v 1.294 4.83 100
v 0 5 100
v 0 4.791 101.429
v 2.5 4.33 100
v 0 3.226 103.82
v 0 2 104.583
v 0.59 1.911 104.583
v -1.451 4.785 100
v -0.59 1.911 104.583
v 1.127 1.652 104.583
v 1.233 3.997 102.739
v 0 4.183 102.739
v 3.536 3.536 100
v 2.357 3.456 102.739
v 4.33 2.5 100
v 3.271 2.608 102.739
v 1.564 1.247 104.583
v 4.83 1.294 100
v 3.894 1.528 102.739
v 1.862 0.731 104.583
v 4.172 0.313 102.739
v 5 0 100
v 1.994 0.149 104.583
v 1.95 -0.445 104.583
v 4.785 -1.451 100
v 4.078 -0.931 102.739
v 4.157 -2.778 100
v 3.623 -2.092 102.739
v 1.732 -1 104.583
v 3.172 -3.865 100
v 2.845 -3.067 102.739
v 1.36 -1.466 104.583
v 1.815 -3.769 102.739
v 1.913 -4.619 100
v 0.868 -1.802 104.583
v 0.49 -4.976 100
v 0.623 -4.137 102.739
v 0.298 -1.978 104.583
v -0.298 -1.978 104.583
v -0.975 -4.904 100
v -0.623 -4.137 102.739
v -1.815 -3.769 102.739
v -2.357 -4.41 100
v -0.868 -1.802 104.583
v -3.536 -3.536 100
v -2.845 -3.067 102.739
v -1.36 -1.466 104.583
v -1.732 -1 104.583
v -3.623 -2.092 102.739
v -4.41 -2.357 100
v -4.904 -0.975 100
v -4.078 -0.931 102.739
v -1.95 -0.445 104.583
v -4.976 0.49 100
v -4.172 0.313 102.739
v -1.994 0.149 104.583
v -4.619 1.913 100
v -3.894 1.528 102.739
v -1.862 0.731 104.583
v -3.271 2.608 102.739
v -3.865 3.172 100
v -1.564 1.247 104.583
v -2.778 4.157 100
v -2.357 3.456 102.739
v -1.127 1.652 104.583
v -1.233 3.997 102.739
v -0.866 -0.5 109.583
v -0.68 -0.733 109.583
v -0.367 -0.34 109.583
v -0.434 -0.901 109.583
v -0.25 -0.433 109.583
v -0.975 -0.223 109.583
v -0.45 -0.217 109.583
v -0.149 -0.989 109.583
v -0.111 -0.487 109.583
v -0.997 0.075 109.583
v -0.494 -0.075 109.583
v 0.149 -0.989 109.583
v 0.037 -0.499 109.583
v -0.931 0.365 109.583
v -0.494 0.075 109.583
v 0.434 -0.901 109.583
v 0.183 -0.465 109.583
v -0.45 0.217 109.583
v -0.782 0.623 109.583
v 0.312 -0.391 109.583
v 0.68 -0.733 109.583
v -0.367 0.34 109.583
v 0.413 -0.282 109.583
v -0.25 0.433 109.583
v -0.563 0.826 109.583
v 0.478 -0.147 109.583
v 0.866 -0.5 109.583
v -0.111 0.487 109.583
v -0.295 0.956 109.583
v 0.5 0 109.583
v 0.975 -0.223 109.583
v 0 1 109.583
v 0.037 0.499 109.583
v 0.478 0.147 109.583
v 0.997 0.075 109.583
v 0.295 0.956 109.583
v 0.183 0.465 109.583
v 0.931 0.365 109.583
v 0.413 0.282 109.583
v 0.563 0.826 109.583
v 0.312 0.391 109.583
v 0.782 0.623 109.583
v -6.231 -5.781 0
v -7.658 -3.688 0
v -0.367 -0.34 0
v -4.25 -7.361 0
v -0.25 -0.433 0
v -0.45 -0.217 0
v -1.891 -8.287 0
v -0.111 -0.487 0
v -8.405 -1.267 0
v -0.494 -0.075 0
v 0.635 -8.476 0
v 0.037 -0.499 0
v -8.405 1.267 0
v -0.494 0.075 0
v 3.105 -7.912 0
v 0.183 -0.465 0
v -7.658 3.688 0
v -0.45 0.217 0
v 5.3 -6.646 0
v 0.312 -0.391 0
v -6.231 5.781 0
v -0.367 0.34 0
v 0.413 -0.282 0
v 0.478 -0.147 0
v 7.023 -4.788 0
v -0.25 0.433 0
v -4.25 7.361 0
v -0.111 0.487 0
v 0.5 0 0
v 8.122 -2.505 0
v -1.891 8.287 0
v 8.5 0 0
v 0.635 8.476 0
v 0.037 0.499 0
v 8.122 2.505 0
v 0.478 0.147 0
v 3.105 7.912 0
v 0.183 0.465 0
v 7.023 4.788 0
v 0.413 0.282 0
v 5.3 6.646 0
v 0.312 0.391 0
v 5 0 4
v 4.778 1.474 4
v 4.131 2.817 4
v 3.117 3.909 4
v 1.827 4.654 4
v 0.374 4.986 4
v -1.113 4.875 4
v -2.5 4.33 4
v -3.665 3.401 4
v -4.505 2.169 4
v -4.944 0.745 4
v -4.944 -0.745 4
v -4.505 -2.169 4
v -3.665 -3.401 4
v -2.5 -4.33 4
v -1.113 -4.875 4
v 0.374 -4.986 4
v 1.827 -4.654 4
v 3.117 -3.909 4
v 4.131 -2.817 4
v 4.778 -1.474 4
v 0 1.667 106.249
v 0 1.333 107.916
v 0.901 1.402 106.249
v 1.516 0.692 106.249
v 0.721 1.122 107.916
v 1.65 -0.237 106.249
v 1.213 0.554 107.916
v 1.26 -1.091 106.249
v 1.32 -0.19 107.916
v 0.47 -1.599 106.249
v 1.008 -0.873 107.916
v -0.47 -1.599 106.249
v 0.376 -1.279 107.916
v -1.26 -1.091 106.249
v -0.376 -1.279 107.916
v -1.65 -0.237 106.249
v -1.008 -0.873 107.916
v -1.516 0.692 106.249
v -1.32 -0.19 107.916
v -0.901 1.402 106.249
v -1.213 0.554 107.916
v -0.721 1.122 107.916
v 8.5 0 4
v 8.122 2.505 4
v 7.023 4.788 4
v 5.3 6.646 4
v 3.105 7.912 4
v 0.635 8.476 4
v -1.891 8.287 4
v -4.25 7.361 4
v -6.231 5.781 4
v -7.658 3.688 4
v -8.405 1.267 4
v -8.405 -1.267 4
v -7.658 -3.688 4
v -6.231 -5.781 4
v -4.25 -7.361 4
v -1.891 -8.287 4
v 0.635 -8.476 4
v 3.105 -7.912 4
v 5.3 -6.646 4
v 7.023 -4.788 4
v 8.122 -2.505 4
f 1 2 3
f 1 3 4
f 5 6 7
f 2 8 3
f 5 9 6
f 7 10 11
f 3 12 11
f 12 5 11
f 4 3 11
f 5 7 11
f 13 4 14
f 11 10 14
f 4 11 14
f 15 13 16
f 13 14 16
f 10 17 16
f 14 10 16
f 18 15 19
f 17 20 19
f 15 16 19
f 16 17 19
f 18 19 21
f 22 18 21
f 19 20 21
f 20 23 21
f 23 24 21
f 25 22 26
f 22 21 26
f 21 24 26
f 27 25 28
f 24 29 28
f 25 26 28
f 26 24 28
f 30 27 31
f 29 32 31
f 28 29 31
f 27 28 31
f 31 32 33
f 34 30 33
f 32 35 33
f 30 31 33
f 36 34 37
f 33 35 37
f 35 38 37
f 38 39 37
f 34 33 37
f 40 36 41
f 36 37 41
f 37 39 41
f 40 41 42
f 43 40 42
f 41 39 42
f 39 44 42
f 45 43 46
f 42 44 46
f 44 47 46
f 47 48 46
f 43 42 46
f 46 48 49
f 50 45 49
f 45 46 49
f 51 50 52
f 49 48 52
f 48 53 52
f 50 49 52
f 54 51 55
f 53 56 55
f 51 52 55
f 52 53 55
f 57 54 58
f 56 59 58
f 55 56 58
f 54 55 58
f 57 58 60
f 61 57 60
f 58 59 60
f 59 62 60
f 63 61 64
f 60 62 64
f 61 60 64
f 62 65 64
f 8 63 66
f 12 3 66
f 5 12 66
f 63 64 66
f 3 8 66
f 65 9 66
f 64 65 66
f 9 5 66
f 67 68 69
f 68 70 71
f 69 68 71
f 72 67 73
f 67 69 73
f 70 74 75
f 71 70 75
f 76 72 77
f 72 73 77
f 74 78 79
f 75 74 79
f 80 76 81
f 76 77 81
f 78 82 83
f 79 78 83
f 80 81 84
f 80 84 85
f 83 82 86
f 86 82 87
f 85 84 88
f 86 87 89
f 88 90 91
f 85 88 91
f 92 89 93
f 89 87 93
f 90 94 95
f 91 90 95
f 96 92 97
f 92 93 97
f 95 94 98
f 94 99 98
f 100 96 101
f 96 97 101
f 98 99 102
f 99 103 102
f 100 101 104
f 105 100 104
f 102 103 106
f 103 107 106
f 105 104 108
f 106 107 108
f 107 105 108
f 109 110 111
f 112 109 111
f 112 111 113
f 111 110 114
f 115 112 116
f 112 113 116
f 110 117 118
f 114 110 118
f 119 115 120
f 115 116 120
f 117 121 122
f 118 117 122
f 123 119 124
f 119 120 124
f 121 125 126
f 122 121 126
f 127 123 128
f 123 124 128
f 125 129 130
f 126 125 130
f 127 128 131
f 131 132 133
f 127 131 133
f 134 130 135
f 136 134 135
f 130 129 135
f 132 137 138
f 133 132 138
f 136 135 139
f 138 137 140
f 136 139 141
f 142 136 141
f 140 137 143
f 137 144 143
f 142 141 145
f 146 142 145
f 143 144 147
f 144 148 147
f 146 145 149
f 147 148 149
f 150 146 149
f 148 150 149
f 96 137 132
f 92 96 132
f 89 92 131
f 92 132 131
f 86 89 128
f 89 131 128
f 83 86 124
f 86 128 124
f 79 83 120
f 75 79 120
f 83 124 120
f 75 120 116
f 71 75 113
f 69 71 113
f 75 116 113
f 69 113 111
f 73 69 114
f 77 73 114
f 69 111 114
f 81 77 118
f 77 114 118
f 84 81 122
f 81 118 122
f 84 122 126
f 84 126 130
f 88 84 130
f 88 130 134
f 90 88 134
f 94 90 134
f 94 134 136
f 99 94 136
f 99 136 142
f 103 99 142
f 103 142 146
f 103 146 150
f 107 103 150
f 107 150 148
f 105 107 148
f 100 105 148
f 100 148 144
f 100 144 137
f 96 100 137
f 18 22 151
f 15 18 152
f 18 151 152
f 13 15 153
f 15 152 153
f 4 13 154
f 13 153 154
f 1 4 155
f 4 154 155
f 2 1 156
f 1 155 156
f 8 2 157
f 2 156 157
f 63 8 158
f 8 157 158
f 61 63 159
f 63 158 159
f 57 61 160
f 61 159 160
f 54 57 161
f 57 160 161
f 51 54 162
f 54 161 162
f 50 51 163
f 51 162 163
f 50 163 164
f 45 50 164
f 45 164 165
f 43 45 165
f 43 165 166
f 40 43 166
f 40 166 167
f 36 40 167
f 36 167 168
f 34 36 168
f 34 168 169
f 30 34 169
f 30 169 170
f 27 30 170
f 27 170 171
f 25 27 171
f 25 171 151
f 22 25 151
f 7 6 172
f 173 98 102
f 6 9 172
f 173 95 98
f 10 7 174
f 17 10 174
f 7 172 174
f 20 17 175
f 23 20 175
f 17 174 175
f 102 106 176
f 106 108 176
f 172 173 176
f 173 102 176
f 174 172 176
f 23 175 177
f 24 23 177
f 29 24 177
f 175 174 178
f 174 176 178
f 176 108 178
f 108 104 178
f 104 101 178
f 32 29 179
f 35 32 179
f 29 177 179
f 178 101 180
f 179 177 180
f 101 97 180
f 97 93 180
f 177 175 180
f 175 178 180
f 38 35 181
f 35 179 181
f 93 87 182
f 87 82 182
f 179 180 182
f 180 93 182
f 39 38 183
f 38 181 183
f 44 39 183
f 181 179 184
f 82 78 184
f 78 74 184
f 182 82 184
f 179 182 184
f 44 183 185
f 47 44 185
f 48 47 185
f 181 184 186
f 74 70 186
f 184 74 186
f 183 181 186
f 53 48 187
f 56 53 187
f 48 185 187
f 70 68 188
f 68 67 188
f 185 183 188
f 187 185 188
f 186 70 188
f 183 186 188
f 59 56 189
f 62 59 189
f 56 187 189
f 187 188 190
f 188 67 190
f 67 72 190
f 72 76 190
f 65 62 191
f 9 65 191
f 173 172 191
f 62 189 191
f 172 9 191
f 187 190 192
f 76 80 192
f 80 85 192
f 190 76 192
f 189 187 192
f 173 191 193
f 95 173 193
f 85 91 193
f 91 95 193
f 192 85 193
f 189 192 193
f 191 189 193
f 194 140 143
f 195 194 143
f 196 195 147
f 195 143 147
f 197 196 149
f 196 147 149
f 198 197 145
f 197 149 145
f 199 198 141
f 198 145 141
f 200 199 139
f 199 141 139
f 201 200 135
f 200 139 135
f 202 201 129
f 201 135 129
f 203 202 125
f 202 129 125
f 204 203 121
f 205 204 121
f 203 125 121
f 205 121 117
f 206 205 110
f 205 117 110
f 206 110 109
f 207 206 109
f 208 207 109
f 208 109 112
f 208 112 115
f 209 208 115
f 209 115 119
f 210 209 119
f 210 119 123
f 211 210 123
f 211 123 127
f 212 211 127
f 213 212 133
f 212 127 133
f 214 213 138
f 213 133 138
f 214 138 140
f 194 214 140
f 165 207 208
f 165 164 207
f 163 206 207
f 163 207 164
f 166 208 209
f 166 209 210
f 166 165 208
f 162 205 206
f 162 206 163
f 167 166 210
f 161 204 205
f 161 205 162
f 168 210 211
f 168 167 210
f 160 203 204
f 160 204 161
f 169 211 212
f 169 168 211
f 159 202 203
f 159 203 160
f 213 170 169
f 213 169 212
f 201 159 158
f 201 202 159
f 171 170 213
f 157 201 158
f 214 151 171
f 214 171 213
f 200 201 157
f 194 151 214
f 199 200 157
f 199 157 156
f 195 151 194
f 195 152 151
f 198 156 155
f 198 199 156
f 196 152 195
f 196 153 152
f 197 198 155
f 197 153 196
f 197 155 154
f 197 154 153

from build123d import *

# Parameters (mm, degrees)
F0_R     = 8.5
F1_DEPTH = 4
F2_R     = 5
F3_DEPTH = 100
F6_R     = 0.5
F7_DEPTH = 118.6


with BuildPart() as f1:
    # F0 (on Top) → F1 (new body)
    with BuildSketch(Plane.XY):
        Circle(F0_R)
    extrude(amount=F1_DEPTH)

    # F2 (on Top) → F3 (join)
    with BuildSketch(Plane.XY):
        Circle(F2_R)
    extrude(amount=F3_DEPTH)

    # F4 (on Right) → F5 (revolve)
    with BuildSketch(Plane.YZ):
        with BuildLine():
            Line((0, 104.582576), (0, 100))
            Line((0, 100), (5, 100))
            ThreePointArc((5, 100), (4.1833, 102.738613), (2, 104.582576))
            Line((2, 104.582576), (0, 104.582576))
        make_face()
        with BuildLine():
            ThreePointArc((0, 105), (1.021548, 104.894532), (2, 104.582576))
            Line((2, 104.582576), (1, 109.582576))
            Line((1, 109.582576), (0, 109.582576))
            Line((0, 109.582576), (0, 105))
        make_face()
        with BuildLine():
            Line((0, 105), (0, 104.582576))
            Line((0, 104.582576), (2, 104.582576))
            ThreePointArc((2, 104.582576), (1.021548, 104.894532), (0, 105))
        make_face()
    revolve(axis=Axis((0, 0, 104.791288), (0, 0, -1)))

    # F6 (on face) → F7 (cut)
    with BuildSketch(Plane(origin=(0, 0, 0), x_dir=(1, 0, 0), z_dir=(0, 0, -1))):
        Circle(F6_R)
    extrude(amount=-F7_DEPTH, mode=Mode.SUBTRACT)


solid = f1.part
